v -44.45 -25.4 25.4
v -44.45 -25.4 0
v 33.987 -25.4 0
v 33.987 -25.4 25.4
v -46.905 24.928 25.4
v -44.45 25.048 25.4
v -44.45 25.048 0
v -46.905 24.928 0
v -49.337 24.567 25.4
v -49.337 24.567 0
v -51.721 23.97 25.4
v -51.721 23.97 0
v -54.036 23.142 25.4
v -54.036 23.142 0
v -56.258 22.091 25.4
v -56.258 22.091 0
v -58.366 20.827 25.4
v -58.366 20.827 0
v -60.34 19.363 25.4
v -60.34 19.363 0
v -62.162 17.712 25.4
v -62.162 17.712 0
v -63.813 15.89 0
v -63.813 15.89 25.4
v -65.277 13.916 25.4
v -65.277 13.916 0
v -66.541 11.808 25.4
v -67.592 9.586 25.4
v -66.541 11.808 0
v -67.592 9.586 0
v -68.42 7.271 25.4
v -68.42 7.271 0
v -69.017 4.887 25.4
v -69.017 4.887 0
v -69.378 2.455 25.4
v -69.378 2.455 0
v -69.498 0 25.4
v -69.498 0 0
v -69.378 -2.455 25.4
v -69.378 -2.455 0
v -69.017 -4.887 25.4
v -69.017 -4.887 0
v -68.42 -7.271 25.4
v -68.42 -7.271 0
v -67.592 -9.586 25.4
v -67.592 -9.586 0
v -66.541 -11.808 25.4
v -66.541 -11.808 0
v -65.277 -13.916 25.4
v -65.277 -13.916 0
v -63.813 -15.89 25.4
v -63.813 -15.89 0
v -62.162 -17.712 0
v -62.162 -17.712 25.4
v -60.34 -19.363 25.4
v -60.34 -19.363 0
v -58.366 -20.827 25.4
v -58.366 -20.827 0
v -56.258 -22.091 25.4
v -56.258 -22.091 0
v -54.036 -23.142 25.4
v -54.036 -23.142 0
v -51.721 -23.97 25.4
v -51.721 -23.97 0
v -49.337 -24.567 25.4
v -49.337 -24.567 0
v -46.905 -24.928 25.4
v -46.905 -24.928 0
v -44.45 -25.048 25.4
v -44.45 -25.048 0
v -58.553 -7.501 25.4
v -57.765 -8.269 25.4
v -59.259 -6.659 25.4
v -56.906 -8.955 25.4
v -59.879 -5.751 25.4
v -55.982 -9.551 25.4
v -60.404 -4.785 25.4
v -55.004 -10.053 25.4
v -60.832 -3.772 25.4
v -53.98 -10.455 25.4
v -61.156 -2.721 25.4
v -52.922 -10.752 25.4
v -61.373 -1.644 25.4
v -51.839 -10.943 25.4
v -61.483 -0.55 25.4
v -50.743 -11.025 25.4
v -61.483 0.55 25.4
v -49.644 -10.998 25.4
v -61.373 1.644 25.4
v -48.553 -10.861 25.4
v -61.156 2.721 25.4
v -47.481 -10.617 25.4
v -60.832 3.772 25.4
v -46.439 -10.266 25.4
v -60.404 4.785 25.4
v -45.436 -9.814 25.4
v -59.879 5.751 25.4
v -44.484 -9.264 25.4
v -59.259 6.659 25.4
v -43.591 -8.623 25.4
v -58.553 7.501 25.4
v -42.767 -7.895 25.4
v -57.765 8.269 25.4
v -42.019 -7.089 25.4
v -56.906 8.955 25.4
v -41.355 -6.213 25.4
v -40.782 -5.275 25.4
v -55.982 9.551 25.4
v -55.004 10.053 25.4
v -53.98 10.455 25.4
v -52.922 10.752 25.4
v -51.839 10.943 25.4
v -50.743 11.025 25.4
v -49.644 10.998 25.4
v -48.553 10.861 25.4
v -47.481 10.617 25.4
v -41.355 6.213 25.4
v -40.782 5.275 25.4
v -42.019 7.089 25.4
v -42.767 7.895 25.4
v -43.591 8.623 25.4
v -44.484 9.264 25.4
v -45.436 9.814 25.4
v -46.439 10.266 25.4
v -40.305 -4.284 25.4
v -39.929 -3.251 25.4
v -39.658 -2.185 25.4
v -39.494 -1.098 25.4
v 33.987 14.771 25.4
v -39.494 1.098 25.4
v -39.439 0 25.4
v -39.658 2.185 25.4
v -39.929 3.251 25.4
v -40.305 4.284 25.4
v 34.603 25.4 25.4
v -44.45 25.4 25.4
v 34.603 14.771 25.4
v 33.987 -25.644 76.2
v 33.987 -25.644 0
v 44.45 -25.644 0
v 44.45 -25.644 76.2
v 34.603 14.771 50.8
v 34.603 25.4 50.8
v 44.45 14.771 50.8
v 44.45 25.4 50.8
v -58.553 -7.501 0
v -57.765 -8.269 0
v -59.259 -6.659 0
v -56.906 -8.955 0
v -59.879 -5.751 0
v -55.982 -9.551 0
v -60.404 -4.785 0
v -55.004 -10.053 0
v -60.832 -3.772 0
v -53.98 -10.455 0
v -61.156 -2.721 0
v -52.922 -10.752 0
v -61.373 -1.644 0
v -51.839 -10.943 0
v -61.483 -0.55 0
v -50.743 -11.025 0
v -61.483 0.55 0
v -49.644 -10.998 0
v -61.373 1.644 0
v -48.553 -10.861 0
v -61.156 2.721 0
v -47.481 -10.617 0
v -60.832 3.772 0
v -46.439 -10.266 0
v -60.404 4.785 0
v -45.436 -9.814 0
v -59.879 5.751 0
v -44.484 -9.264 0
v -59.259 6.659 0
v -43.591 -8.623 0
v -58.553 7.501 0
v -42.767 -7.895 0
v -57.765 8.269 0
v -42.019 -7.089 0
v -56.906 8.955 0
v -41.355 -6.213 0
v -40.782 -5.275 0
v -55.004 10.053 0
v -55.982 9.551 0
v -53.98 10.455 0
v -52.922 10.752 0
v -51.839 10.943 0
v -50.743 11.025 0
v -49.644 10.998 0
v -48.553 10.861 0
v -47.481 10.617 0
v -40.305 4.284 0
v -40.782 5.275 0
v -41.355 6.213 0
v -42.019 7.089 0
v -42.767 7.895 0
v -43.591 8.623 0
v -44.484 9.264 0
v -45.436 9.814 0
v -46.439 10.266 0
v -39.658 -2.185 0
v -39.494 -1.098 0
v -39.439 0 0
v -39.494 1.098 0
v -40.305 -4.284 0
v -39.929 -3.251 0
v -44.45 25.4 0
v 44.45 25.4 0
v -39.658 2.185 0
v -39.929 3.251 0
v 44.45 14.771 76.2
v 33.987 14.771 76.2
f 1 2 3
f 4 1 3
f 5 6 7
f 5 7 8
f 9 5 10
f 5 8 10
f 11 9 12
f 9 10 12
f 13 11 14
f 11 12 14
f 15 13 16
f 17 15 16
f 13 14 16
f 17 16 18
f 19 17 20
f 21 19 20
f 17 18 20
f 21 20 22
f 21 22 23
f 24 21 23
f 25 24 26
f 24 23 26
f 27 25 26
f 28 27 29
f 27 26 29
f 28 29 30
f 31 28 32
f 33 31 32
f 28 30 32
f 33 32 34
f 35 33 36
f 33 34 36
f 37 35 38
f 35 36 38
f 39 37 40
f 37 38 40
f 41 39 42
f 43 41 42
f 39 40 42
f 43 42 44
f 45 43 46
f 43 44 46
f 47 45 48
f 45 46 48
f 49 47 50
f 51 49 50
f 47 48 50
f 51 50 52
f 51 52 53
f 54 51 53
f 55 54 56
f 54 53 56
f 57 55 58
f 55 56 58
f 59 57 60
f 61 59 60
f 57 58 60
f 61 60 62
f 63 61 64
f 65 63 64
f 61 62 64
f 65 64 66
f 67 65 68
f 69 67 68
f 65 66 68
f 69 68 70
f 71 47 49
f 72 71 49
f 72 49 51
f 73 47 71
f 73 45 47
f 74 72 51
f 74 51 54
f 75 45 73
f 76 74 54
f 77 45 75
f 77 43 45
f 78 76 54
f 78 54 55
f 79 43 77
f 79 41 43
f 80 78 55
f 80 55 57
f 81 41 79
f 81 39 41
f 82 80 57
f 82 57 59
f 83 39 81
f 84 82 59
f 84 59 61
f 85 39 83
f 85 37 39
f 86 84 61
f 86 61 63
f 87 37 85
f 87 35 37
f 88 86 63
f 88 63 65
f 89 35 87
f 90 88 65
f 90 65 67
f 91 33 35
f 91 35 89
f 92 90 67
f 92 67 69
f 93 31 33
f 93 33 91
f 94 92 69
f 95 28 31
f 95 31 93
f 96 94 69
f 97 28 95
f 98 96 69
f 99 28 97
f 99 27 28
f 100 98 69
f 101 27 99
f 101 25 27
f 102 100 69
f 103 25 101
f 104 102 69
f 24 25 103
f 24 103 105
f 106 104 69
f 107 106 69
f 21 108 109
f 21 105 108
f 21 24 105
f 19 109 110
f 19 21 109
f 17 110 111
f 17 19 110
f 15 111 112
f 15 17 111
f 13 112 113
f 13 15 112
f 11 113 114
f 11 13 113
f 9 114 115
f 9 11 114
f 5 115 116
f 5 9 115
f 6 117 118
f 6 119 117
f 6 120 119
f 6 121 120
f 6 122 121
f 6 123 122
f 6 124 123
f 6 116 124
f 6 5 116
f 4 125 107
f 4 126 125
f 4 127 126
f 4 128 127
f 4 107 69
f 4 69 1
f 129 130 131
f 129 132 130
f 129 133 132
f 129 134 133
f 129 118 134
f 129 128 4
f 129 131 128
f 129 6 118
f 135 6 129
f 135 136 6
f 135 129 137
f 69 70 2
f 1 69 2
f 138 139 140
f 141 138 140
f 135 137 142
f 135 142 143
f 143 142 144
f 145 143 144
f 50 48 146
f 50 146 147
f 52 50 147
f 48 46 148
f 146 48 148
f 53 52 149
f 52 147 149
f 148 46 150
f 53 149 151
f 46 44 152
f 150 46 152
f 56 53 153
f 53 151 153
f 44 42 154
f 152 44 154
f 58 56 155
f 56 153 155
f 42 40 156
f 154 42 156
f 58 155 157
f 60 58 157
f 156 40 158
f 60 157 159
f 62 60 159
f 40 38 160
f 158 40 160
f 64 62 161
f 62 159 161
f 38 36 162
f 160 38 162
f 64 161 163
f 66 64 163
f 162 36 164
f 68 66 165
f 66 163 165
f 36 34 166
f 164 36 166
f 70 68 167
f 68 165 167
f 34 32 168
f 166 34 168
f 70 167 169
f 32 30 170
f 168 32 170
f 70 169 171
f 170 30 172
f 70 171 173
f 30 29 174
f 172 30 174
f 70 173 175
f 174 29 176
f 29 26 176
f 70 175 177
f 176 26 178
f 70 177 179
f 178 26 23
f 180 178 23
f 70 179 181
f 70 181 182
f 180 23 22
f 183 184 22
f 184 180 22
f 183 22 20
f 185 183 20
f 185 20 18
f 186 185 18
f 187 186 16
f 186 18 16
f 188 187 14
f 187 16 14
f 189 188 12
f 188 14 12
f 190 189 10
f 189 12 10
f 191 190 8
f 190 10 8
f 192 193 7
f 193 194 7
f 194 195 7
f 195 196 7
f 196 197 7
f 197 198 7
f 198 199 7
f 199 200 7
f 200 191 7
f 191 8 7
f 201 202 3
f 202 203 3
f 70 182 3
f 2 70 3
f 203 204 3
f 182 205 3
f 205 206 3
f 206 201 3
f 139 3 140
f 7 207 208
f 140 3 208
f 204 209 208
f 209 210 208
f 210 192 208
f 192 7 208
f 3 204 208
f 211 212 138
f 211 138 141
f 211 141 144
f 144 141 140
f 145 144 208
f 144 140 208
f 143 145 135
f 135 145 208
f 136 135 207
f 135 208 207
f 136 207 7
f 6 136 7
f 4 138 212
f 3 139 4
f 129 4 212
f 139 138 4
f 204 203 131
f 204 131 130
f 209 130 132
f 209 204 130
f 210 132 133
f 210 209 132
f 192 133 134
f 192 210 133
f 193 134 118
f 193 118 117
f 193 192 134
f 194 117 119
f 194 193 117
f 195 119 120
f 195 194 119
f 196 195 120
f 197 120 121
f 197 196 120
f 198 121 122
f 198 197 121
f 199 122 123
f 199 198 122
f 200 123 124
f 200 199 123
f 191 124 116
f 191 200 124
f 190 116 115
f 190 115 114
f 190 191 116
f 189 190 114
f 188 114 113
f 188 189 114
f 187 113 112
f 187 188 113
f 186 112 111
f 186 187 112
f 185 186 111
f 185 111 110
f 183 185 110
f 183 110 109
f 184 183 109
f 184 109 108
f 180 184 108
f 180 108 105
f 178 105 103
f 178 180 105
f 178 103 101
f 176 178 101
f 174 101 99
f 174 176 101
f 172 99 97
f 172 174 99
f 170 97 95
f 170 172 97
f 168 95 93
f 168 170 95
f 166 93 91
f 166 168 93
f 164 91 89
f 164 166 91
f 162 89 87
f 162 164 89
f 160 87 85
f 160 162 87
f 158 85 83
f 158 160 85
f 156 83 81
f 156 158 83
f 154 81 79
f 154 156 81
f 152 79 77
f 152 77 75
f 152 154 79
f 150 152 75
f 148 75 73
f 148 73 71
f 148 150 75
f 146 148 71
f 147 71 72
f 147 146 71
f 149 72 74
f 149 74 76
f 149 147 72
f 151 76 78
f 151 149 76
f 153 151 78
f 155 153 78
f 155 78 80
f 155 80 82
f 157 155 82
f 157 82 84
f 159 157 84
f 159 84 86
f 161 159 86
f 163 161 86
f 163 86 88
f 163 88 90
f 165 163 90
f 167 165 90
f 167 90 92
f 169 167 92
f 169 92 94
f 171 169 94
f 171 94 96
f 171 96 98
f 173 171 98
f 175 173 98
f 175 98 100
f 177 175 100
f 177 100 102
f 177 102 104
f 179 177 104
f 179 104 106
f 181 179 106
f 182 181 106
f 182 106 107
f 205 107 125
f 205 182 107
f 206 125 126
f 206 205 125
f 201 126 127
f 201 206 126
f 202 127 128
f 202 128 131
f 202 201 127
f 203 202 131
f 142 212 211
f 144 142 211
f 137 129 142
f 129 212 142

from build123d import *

# Parameters (mm, degrees)
F1_DEPTH = 25.4
F2_R     = 11.0288087202
F3_DEPTH = 25.4
F4_W     = 9.8473913968
F4_H     = 10.6680002064
F6_DEPTH = 50.8
F5_W     = 10.4628503323
F5_H     = 40.4153093696
F7_DEPTH = 76.2


with BuildPart() as f1:
    # F0 (on Top) → F1 (new body)
    with BuildSketch(Plane.XY):
        with BuildLine():
            Line((-44.45, -25.4), (44.45, -25.4))
            Line((44.45, -25.4), (44.45, 25.4))
            Line((44.45, 25.4), (-44.45, 25.4))
            Line((-44.45, 25.4), (-44.45, 25.0481939564))
            ThreePointArc((-44.45, 25.0481939564), (-26.738252197, 17.711747803), (-19.4018060436, 0))
            ThreePointArc((-19.4018060436, 0), (-26.738252197, -17.711747803), (-44.45, -25.0481939564))
            Line((-44.45, -25.0481939564), (-44.45, -25.4))
        make_face()
        with BuildLine():
            ThreePointArc((-44.45, 25.0481939564), (-69.4981939564, 0), (-44.45, -25.0481939564))
            Line((-44.45, -25.0481939564), (-44.45, 25.0481939564))
        make_face()
        with BuildLine():
            Line((-44.45, 25.0481939564), (-44.45, -25.0481939564))
            ThreePointArc((-44.45, -25.0481939564), (-26.738252197, -17.711747803), (-19.4018060436, 0))
            ThreePointArc((-19.4018060436, 0), (-26.738252197, 17.711747803), (-44.45, 25.0481939564))
        make_face()
    extrude(amount=F1_DEPTH)

    # F2 (on Top) → F3 (cut)
    with BuildSketch(Plane.XY):
        with Locations((-50.4678487778, 0)):
            Circle(F2_R)
    extrude(amount=F3_DEPTH, mode=Mode.SUBTRACT)

    # F4 (on Top) → F6 (join)
    with BuildSketch(Plane.XY):
        with Locations((39.5263043016, 20.0659998968)):
            Rectangle(F4_W, F4_H)
    extrude(amount=F6_DEPTH)

    # F5 (on Top) → F7 (join)
    with BuildSketch(Plane.XY):
        with Locations((39.2185748339, -5.4365769029)):
            Rectangle(F5_W, F5_H)
    extrude(amount=F7_DEPTH)


solid = f1.part
